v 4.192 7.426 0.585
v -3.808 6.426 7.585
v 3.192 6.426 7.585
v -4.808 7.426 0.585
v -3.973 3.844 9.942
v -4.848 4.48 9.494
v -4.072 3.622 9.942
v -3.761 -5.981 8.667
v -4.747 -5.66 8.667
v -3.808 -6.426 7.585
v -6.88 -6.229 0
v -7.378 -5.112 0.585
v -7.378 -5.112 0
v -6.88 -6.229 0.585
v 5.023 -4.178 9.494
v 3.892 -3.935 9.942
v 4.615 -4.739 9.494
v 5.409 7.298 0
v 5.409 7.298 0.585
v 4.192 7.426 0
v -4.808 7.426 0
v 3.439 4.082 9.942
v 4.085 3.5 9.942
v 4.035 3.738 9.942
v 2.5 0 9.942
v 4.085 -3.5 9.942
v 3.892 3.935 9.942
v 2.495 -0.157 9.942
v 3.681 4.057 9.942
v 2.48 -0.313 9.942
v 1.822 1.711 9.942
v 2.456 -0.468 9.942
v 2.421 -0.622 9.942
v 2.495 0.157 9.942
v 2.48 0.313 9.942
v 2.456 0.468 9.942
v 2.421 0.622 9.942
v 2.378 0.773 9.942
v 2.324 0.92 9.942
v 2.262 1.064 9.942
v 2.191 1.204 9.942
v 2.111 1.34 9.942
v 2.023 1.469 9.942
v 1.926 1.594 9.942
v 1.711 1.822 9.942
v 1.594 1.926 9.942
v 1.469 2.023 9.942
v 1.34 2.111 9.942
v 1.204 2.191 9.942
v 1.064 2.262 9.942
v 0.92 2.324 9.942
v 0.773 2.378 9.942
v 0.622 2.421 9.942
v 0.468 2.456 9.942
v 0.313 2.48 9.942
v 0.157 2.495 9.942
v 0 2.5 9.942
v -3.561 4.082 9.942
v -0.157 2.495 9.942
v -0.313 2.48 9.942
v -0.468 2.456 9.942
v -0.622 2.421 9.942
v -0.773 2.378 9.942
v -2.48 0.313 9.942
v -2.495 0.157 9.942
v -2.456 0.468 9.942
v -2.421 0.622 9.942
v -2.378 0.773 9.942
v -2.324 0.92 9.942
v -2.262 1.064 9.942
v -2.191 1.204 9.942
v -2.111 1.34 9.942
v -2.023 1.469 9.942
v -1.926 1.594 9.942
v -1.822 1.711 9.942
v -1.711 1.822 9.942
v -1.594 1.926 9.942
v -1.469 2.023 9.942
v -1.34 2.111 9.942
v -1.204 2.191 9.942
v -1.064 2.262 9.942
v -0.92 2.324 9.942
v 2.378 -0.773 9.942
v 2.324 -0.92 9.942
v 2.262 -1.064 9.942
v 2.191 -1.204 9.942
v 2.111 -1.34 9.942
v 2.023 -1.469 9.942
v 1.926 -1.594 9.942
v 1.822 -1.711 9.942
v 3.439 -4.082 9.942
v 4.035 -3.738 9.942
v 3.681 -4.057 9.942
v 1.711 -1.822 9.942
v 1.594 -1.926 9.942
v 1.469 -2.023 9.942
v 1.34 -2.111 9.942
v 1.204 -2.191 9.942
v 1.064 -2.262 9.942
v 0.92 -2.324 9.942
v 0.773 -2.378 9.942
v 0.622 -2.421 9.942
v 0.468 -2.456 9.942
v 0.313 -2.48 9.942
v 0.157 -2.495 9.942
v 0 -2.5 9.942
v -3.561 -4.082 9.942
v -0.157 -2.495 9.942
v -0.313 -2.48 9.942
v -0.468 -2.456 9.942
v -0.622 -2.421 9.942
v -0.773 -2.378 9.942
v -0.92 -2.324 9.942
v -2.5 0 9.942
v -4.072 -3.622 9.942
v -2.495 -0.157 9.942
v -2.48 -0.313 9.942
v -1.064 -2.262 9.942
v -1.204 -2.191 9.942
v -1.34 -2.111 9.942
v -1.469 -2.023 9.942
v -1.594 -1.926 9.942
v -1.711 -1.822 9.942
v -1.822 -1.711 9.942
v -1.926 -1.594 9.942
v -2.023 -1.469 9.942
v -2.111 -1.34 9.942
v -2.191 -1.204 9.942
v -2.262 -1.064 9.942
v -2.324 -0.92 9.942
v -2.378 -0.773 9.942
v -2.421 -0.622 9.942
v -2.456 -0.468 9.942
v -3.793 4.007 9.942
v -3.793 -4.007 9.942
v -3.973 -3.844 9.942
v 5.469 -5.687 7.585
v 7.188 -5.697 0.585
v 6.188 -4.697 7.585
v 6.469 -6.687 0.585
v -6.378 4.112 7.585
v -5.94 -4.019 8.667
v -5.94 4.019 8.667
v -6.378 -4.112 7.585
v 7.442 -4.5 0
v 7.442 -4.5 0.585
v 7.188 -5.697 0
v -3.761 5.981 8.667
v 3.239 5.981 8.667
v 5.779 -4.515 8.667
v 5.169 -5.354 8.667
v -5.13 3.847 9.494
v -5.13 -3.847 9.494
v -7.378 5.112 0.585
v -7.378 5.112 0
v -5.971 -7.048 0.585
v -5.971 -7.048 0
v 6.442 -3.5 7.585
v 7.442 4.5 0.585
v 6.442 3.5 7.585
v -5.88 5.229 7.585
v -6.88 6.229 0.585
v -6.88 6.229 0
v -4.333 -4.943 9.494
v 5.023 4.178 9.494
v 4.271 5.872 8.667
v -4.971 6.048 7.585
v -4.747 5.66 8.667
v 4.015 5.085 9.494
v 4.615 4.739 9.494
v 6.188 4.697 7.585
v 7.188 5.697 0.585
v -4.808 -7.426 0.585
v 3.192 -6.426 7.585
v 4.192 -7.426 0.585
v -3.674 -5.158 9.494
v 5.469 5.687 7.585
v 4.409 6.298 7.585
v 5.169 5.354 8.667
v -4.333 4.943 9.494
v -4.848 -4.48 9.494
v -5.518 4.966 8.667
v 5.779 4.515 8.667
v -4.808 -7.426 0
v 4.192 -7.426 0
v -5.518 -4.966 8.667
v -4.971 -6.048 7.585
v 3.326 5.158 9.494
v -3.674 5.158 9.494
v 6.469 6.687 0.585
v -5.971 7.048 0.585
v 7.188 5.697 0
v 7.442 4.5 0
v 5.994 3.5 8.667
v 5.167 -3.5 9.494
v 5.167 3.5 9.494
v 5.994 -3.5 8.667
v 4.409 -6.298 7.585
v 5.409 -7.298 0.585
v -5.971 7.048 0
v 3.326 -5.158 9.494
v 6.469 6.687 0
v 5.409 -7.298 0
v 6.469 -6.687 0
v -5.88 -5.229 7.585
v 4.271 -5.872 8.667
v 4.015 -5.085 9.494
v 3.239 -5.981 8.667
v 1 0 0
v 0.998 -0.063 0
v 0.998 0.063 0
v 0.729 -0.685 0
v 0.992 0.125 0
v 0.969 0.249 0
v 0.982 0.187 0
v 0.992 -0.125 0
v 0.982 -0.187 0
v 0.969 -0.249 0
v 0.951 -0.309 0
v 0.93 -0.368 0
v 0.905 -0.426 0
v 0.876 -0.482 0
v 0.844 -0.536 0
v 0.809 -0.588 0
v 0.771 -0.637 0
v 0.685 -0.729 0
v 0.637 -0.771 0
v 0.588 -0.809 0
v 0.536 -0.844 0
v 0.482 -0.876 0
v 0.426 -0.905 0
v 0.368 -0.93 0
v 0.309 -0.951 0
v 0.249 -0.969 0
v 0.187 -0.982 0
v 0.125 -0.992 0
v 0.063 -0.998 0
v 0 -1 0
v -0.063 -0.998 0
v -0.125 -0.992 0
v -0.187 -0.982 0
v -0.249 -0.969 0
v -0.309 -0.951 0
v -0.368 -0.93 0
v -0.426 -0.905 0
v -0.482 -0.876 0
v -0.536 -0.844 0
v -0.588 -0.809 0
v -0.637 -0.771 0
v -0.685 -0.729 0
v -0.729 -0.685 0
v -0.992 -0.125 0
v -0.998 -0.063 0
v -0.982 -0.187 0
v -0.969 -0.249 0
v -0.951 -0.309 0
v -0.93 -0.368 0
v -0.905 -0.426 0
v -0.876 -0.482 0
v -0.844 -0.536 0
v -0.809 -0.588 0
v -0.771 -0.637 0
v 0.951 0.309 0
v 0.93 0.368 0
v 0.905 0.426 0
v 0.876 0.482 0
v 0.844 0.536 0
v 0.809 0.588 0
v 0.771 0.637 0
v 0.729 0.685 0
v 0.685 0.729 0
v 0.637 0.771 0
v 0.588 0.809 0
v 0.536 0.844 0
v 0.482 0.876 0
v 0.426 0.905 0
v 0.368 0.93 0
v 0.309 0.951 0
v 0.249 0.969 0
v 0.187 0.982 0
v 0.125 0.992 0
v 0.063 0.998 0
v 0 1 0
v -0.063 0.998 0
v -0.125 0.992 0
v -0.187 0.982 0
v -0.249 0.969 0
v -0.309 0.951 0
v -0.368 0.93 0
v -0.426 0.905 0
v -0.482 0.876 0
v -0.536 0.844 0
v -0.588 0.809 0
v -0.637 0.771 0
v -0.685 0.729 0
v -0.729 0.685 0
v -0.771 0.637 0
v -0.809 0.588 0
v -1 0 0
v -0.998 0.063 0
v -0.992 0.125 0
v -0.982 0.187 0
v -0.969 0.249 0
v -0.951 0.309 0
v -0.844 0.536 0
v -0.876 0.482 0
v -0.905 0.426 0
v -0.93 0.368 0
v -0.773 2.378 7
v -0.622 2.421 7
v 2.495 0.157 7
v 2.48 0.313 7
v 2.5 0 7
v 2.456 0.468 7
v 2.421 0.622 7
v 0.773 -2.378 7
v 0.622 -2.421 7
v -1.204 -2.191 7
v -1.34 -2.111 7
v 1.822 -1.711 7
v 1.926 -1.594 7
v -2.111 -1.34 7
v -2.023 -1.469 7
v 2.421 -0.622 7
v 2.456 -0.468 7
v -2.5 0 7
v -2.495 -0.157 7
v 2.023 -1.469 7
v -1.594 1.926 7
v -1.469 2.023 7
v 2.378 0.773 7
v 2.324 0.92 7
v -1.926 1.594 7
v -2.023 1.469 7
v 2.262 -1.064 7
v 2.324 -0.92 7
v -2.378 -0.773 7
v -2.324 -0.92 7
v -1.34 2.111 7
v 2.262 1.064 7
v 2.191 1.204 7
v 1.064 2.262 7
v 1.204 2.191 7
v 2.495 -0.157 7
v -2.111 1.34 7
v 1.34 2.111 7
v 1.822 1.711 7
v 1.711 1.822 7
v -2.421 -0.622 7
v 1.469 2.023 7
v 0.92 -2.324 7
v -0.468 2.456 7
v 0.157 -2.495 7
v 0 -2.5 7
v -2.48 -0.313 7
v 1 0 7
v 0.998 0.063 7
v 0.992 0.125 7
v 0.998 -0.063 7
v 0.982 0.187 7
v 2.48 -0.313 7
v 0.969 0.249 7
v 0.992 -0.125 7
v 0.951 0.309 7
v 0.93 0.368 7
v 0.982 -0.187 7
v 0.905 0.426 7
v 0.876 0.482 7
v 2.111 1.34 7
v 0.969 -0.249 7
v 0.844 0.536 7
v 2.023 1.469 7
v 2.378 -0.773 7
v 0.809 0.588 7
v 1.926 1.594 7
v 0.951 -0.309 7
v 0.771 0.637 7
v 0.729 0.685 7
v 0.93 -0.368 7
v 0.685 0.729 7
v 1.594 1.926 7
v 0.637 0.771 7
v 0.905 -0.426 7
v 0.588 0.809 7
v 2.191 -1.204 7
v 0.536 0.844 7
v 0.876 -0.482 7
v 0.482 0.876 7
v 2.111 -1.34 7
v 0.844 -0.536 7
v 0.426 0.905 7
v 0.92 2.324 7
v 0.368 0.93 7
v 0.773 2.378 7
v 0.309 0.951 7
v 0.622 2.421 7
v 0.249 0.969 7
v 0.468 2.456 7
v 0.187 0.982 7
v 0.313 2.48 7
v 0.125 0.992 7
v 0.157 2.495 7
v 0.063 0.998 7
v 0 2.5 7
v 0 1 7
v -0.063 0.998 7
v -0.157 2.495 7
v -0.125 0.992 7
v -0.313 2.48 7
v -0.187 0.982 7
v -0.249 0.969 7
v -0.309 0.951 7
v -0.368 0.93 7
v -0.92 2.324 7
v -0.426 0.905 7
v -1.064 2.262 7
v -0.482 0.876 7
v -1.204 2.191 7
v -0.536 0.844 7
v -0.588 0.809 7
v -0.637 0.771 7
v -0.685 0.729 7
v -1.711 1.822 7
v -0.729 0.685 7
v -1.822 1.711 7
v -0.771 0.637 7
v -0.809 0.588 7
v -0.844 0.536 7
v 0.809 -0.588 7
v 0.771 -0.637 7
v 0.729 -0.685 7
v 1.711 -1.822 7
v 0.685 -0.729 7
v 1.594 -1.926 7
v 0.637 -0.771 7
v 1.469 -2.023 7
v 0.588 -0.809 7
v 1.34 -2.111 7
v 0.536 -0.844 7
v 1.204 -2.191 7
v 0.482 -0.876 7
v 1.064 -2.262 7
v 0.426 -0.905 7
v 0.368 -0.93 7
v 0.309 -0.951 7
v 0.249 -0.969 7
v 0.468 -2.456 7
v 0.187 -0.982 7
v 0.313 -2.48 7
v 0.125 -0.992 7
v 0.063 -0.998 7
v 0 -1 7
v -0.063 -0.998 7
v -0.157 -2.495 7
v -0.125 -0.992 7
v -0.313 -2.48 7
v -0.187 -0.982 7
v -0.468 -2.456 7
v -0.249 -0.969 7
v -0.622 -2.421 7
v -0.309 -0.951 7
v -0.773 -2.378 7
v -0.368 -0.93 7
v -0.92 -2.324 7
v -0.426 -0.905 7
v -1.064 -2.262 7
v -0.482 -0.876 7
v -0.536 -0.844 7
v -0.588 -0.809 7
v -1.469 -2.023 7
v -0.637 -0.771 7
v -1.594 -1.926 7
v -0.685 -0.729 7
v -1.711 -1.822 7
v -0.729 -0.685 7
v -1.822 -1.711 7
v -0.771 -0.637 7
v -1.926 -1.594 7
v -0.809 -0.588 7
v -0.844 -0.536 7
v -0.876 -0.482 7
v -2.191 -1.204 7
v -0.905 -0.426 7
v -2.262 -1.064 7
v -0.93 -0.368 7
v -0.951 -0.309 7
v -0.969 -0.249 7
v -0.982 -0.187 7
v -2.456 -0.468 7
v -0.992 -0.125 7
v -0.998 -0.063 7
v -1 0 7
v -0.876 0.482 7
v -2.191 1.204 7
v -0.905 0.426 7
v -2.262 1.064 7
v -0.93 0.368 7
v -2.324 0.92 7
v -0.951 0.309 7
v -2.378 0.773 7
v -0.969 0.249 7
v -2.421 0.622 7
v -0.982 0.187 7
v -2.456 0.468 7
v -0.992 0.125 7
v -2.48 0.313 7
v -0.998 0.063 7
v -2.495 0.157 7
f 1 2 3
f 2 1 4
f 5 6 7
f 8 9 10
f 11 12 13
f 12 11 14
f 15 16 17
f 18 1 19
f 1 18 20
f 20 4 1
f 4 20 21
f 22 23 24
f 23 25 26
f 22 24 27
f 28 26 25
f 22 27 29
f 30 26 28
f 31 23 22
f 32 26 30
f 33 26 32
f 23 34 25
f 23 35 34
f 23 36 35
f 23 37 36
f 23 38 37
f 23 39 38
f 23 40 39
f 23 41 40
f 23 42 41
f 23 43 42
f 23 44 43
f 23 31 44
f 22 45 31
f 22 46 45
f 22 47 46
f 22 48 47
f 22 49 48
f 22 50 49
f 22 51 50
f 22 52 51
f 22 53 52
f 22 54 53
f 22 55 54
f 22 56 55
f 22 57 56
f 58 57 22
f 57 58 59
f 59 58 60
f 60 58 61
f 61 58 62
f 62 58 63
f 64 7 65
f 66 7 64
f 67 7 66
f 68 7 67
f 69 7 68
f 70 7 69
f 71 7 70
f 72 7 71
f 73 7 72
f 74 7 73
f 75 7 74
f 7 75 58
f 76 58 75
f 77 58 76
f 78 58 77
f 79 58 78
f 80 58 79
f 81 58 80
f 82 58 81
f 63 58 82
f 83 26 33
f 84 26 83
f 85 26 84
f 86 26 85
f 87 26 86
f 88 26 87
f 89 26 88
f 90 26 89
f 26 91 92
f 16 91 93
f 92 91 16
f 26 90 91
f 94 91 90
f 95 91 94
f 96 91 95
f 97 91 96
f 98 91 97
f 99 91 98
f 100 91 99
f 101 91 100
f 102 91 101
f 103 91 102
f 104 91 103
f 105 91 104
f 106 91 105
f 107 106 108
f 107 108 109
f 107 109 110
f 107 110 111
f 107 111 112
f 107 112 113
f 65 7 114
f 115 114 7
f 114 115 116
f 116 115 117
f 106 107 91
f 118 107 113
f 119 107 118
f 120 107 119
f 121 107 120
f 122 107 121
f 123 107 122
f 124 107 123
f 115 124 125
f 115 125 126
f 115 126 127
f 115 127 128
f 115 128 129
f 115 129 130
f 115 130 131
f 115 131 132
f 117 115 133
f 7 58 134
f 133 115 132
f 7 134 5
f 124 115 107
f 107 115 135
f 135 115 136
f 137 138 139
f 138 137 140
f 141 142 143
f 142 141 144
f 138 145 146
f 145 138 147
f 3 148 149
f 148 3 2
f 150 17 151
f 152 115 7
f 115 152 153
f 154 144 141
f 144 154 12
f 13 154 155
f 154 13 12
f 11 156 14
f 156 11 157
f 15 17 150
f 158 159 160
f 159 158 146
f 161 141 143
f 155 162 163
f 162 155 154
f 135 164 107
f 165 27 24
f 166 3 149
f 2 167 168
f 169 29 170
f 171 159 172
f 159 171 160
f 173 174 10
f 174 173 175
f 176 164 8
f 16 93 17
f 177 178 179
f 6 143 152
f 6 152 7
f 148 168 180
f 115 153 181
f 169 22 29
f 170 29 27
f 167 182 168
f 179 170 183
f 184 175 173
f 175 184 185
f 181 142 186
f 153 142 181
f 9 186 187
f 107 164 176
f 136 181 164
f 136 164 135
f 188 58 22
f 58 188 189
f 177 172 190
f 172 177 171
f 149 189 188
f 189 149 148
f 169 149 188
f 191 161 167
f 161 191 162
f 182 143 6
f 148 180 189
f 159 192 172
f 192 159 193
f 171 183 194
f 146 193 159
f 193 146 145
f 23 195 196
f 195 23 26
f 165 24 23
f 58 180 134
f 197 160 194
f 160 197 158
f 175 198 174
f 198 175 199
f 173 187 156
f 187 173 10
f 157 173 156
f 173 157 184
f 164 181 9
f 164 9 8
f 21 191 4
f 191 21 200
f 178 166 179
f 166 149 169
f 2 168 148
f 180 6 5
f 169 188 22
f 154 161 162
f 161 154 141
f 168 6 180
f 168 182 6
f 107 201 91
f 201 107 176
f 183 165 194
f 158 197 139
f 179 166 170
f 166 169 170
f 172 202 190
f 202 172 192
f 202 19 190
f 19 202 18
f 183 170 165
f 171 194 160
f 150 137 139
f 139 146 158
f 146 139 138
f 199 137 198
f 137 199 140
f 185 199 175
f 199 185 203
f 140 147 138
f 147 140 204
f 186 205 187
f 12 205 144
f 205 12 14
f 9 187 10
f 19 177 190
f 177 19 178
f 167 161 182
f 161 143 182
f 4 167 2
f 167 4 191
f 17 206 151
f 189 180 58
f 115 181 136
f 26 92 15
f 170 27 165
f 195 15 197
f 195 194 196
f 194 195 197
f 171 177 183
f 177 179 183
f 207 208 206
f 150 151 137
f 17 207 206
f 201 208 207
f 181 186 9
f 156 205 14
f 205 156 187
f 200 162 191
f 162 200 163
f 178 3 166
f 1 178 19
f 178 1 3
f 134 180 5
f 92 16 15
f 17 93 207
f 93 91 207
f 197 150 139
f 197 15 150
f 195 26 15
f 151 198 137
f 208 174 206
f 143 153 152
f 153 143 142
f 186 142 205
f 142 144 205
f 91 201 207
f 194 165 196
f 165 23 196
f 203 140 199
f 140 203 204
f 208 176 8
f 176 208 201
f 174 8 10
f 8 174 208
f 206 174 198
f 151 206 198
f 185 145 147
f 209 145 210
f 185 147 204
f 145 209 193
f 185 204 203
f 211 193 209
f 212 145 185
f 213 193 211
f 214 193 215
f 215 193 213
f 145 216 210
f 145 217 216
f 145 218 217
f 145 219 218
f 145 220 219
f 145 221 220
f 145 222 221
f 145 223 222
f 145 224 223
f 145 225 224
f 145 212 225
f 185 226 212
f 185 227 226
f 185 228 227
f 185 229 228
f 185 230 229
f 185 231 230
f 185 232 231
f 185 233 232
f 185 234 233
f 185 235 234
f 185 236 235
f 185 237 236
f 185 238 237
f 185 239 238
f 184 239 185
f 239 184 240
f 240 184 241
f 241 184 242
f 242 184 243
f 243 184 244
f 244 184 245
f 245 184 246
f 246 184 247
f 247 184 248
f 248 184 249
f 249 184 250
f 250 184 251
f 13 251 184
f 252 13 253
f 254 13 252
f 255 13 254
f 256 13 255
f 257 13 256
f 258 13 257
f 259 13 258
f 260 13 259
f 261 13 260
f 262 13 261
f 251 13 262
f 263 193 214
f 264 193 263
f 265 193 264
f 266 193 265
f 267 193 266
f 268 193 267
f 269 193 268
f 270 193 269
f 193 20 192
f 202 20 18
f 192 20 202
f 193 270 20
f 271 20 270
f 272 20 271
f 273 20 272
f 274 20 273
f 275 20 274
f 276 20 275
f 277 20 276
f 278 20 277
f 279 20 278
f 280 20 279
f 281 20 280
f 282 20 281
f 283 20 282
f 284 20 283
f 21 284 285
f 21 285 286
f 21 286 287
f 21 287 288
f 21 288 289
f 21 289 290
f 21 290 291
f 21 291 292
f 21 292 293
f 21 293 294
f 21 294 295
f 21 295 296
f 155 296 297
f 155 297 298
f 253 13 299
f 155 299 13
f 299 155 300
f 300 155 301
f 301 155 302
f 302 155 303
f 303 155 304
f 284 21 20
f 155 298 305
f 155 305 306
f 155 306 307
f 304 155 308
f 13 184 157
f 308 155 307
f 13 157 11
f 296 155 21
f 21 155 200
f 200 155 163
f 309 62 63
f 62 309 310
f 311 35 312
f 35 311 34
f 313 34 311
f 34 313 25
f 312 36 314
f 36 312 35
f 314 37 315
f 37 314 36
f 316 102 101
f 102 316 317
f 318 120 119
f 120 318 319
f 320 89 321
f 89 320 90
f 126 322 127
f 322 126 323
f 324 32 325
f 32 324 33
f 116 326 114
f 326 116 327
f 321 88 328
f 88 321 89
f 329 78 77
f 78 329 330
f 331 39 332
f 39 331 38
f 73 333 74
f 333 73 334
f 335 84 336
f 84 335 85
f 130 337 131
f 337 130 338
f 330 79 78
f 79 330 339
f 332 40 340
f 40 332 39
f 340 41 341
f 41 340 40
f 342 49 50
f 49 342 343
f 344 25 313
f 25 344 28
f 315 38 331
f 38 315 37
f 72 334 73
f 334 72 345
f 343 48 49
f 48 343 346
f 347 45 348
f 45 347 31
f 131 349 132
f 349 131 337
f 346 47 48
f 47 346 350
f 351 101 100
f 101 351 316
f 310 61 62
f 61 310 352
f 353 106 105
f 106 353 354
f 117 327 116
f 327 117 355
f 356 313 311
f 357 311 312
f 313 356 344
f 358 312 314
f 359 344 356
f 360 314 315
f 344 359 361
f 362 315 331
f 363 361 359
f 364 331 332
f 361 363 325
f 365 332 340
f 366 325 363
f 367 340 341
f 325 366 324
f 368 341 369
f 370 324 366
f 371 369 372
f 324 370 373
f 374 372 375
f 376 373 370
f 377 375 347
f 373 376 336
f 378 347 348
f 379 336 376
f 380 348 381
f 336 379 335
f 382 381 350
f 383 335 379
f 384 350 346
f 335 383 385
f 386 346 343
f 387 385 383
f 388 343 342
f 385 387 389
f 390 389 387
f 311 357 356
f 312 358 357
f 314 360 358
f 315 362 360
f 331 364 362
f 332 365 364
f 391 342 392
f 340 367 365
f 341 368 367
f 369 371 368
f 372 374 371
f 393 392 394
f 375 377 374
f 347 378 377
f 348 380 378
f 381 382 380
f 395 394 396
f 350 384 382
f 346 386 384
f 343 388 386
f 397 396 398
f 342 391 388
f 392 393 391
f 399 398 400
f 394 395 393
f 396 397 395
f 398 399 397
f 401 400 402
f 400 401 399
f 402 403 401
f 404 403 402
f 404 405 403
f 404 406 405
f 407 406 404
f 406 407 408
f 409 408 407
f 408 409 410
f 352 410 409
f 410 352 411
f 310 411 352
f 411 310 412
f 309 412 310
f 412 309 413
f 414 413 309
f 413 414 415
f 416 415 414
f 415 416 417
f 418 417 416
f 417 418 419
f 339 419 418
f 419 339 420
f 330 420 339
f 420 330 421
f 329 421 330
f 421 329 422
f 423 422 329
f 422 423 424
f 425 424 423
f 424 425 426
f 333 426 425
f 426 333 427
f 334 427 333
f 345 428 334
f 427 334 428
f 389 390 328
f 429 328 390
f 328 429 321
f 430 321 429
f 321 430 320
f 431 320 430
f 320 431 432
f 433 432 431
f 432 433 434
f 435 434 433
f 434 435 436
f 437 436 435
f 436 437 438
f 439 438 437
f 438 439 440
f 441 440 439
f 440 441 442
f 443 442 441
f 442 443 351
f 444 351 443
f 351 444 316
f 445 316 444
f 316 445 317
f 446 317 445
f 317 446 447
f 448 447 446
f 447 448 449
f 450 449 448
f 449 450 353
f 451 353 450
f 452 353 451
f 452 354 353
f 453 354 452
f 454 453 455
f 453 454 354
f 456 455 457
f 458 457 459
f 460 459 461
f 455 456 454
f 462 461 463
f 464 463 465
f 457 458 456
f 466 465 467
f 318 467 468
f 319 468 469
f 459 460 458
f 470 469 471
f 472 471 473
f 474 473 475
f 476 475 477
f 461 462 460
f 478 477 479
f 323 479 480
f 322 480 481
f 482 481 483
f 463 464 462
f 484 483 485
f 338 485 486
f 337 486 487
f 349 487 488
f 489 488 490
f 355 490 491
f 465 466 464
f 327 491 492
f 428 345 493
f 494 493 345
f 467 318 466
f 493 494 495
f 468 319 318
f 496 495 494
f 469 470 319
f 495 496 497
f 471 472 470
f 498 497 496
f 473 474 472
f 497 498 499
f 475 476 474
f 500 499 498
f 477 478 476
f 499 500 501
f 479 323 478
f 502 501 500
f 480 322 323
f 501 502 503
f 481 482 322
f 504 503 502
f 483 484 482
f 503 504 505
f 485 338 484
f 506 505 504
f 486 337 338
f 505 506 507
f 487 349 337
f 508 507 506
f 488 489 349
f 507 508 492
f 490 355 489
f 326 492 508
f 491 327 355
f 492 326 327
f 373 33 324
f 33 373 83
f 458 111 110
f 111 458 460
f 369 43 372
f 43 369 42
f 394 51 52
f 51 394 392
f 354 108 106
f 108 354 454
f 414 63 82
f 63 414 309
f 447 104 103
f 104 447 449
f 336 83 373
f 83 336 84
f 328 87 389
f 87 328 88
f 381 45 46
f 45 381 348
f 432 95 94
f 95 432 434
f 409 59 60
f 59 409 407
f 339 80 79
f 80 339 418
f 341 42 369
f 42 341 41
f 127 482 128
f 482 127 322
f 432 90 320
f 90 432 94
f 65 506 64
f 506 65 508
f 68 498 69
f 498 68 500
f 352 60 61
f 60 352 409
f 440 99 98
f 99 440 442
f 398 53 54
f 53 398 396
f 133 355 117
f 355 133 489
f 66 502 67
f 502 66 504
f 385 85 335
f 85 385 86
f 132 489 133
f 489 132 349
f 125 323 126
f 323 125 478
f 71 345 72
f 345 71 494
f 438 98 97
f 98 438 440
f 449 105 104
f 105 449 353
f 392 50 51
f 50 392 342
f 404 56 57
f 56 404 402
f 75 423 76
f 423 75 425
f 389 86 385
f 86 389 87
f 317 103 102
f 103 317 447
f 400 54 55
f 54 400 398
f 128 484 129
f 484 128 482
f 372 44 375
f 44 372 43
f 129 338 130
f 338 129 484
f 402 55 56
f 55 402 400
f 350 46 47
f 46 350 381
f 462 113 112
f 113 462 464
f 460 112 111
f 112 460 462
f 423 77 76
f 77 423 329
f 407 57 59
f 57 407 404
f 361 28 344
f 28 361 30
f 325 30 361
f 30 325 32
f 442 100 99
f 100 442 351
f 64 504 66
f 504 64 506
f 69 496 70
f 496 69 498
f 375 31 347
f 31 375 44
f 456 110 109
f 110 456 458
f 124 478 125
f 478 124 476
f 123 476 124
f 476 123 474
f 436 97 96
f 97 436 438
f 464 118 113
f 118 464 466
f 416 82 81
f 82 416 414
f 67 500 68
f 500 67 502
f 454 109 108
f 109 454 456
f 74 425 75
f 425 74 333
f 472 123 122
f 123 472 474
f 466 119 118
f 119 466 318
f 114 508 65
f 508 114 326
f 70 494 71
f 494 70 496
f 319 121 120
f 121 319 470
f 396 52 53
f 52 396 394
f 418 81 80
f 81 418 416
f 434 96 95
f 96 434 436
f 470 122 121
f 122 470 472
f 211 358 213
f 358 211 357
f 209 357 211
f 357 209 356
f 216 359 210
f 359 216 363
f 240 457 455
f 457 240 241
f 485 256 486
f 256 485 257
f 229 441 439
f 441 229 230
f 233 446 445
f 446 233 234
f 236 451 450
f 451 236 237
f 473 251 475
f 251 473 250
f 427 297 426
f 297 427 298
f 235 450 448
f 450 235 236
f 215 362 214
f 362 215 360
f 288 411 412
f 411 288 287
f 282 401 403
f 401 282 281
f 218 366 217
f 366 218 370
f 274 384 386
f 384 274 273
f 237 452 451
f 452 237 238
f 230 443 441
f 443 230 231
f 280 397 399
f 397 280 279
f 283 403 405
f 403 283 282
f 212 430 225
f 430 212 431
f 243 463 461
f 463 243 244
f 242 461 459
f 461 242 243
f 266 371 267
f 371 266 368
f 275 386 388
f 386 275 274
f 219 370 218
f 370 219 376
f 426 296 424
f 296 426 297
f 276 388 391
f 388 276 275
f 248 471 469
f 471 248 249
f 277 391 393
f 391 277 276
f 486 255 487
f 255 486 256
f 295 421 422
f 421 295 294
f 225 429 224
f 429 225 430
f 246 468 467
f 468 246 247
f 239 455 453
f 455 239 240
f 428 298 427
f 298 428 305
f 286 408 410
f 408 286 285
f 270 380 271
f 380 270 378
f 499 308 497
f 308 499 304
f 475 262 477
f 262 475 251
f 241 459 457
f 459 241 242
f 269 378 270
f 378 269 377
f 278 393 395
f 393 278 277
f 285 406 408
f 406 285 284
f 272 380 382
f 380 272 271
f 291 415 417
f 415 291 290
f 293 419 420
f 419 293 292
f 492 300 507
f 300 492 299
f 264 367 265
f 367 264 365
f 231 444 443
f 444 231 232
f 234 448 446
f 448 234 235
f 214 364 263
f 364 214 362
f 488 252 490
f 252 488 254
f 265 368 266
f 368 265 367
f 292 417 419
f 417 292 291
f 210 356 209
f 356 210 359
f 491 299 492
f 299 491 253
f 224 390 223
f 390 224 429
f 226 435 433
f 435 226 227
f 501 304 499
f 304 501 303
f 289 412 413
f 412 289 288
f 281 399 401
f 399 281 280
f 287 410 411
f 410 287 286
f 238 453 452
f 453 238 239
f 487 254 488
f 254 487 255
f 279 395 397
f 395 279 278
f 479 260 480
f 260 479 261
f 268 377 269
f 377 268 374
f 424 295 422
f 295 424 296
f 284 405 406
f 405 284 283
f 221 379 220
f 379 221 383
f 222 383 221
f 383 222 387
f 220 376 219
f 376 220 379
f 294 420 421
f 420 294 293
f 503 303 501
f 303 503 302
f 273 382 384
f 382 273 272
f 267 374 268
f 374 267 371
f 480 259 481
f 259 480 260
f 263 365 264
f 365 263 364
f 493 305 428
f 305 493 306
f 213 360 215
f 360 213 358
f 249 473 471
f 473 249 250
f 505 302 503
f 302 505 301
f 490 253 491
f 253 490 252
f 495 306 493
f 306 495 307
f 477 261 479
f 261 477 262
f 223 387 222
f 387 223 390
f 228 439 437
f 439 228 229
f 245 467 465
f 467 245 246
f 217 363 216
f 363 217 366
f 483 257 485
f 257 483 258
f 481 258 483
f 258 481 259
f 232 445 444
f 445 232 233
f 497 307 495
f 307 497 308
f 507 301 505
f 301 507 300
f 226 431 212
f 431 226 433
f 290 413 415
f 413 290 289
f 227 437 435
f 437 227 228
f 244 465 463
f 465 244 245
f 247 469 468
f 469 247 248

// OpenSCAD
/* 

Parametric Project Foot Generator 

Mike Creuzer - thingiverse@creuzer.com 2013-03-31


*/

// Top is against the project
TopWidth = 15;
// Bottom is agains the floor
BottomWidth = 10;
// How tall the foot is
Height = 10;
// Curved edge radius
Smoothing = 3;
// Smothness of the Smoothing - aka the curve faciting.  15 is faceted but fastish, 100 is really smooth and takes days to render.
SubSmoothing = 15;

// Width of bolt head hole - including room for a ratchet socket if needed
BoltHeadWidth = 5;
// Depth of bolt head hole
BoltHeadDepth = 3;
// Bolt hole width/diameter
BoltWidth = 2;


difference()
{
	SquareFoot();
	bolthole();
}





module bolthole()
{
	translate([0,0,Height - (BoltHeadDepth/2)]) cylinder(h = BoltHeadDepth, r= BoltHeadWidth / 2, $fn=100, center = true);
	translate([0,0,Height/2]) cylinder(h = Height, r= BoltWidth / 2, $fn=100, center = true);
}



module SquareFoot()
{

difference()
{
	minkowski()
	{
		hull()
		{
			cube(size = [TopWidth - (2*Smoothing),TopWidth - (2*Smoothing),0.0001], center = true);
			translate([0,0,Height - Smoothing]) cube(size = [BottomWidth - (Smoothing),BottomWidth - (Smoothing),0.0001], center = true);
		}
		sphere(r=Smoothing, $fn=SubSmoothing);
	}
	translate([0,0, - Smoothing])  cube(size = [TopWidth,TopWidth,Smoothing * 2], center = true);
}


// These are just reference marks so I know that I got the shape and size right.
% hull()
{
 cube(size = [TopWidth,TopWidth,0.0001], center = true);
 translate([0,0,Height]) cube(size = [BottomWidth,BottomWidth,0.0001], center = true);
}

}
